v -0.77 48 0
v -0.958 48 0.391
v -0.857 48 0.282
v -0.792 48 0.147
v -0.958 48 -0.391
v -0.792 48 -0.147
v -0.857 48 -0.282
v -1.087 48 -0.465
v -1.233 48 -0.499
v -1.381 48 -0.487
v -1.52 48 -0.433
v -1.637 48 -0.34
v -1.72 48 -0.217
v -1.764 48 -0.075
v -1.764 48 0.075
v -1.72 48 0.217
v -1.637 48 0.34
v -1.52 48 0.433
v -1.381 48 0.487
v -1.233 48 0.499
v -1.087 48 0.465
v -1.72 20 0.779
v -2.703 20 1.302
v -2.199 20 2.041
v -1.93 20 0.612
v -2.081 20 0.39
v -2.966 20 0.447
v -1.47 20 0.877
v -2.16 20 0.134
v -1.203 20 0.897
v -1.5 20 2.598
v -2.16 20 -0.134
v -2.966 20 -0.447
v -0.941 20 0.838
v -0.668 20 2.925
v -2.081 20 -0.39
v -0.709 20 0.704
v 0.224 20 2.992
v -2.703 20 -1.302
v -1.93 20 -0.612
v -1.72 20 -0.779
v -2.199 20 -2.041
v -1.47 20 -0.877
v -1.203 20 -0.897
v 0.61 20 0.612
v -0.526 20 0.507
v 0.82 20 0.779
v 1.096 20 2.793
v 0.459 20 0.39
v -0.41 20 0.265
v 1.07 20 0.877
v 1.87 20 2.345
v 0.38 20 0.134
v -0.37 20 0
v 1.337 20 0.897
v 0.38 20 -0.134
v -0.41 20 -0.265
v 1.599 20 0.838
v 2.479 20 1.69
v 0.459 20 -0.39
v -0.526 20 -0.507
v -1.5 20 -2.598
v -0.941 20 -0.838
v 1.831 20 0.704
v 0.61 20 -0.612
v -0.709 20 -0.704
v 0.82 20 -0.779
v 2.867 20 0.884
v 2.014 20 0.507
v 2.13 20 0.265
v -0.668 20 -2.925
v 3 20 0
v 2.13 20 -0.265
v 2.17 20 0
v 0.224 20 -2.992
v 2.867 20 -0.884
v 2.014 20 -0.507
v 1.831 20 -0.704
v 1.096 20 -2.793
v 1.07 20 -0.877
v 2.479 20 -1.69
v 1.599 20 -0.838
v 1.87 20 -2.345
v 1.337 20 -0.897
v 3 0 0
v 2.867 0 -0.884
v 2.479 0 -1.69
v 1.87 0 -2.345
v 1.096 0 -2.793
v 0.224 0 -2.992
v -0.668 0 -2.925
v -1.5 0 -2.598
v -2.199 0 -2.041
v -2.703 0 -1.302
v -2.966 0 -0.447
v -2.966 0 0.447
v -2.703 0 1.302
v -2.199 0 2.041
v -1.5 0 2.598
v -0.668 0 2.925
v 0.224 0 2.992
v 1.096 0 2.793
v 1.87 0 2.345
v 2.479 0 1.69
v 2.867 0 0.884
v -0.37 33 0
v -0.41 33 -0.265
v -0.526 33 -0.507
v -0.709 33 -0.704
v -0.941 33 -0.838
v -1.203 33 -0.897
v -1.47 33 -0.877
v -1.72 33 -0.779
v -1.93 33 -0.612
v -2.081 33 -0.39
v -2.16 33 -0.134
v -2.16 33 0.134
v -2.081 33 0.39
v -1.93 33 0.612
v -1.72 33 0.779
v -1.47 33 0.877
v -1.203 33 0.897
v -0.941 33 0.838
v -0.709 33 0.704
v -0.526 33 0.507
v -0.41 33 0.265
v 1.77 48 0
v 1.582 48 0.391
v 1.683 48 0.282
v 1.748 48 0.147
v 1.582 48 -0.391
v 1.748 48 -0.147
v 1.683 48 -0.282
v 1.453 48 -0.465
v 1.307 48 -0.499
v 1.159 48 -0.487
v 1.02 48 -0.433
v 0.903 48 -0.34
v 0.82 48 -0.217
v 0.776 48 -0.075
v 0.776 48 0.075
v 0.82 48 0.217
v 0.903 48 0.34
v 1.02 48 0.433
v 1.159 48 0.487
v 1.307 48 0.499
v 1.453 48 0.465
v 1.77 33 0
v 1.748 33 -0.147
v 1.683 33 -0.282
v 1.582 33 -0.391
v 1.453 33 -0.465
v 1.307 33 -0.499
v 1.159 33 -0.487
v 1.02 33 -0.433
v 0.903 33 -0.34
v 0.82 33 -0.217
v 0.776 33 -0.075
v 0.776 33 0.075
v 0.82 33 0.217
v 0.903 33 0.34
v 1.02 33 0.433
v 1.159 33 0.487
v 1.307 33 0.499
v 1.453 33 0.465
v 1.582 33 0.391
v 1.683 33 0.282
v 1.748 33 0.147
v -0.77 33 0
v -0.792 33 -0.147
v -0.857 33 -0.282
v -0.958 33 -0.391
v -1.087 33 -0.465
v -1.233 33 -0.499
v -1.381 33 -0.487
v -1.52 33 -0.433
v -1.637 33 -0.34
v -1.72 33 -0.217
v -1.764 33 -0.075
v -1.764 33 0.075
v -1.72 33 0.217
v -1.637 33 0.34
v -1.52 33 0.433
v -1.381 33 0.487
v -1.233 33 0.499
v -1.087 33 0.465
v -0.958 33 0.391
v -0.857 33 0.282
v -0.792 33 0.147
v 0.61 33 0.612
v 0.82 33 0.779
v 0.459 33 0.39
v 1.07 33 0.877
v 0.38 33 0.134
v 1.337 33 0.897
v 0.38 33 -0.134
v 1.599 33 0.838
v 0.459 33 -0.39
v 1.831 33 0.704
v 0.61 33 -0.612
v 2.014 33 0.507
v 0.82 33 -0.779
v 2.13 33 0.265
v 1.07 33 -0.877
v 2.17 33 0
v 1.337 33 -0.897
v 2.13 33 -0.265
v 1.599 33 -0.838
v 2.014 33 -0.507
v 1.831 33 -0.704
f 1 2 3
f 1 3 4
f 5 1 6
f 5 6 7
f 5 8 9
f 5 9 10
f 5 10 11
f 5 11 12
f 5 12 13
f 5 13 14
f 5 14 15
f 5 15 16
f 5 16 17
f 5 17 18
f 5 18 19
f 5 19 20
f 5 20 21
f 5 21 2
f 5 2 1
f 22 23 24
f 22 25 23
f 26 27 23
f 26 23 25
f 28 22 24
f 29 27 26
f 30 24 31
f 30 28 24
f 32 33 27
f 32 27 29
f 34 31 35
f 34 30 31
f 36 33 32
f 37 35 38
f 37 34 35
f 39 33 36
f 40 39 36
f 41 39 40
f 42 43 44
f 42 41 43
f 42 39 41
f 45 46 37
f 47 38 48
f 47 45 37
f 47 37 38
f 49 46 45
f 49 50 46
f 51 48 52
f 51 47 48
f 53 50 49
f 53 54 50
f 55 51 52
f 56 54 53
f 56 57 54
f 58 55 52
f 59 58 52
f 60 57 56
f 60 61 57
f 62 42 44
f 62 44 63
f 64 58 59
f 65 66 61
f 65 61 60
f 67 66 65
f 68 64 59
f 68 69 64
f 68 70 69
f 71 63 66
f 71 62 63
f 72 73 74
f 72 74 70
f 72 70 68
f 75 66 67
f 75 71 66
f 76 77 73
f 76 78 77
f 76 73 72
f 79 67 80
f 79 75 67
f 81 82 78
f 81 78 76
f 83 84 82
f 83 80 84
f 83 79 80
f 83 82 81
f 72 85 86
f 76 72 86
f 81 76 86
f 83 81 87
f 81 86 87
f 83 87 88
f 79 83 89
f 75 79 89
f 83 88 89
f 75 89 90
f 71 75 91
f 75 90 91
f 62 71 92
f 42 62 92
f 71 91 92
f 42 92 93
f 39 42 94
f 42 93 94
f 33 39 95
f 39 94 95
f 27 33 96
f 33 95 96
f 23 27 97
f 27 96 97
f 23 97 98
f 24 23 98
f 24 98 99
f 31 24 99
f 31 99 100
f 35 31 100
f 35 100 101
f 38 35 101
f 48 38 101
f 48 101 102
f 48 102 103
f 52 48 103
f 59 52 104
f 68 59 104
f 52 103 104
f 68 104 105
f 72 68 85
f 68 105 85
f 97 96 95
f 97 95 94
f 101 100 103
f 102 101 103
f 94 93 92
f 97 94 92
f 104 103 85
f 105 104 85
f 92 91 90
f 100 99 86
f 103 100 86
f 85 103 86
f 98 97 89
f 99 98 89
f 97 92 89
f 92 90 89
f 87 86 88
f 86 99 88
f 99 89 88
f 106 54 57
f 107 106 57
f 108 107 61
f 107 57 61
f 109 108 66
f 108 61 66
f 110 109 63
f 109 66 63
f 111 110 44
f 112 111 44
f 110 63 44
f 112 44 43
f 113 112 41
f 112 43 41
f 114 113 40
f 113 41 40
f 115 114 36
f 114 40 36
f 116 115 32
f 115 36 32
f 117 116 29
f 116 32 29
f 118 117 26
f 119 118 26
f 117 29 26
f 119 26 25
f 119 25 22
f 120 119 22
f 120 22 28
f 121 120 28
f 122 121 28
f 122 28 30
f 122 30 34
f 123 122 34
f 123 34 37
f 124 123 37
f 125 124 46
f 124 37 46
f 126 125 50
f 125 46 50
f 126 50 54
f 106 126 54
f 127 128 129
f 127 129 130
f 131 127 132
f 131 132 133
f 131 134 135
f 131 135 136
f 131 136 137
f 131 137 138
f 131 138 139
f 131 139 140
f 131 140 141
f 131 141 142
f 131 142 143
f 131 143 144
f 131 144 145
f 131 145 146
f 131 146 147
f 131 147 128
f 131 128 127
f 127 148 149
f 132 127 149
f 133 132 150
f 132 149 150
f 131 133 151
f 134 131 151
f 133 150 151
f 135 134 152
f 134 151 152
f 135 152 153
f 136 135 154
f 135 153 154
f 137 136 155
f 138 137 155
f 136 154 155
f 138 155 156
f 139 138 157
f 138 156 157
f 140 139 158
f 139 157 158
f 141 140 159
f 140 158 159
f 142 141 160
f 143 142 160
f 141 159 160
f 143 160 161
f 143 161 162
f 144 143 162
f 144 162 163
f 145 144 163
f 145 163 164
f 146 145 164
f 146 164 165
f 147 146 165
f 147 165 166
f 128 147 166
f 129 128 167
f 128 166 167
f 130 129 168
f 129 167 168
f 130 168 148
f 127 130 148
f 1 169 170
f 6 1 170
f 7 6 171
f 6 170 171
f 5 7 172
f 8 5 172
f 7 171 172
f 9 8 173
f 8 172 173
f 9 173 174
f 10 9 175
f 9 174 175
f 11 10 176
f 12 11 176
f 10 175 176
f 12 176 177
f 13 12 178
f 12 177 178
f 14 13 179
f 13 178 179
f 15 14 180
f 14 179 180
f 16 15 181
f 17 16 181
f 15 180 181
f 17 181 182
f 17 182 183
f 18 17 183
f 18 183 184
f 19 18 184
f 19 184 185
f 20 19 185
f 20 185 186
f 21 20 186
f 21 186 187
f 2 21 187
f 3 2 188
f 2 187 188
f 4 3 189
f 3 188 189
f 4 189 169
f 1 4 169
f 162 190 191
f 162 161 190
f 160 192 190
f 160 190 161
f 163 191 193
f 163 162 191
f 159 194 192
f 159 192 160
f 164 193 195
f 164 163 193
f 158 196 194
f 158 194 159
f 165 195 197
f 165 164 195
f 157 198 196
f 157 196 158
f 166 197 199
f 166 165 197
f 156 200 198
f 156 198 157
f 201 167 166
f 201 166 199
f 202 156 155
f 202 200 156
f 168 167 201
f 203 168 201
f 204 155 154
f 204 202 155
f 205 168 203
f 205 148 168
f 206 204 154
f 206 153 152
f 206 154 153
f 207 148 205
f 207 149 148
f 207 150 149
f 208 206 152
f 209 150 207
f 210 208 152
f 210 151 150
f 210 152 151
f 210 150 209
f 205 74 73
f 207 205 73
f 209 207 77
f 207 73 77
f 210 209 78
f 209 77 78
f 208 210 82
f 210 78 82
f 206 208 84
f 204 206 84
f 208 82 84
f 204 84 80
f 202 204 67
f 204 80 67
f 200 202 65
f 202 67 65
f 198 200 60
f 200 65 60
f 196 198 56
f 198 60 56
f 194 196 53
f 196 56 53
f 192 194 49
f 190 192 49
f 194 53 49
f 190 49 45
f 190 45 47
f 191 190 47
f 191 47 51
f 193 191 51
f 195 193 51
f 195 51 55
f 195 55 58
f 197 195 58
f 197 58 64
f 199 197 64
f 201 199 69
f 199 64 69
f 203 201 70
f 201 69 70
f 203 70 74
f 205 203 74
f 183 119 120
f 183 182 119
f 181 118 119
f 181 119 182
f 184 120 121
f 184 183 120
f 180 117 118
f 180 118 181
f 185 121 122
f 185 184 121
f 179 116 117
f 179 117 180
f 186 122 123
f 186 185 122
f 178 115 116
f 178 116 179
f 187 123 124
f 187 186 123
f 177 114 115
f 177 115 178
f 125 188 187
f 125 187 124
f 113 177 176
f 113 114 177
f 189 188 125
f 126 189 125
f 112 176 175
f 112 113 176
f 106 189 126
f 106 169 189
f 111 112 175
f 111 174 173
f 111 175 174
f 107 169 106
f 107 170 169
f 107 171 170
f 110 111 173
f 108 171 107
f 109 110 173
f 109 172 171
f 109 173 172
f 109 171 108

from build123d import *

# Parameters (mm, degrees)
SKETCH1_R           = 3
BOSS_EXTRUDE1_DEPTH = 20
SKETCH2_R           = 0.9
BOSS_EXTRUDE2_DEPTH = 13
SKETCH3_R           = 0.5
BOSS_EXTRUDE3_DEPTH = 15


with BuildPart() as part:
    # Sketch1 → Boss-Extrude1 (new body)
    with BuildSketch(Plane(origin=(0, 0, 0), x_dir=(1, 0, 0), z_dir=(0, 1, 0))):
        Circle(SKETCH1_R)
    extrude(amount=BOSS_EXTRUDE1_DEPTH)

    # Sketch2 → Boss-Extrude2 (add)
    with BuildSketch(Plane(origin=(0, 20, 0), x_dir=(1, 0, 0), z_dir=(0, 1, 0))):
        with Locations((1.27, 0)):
            Circle(SKETCH2_R)
        with Locations((-1.27, 0)):
            Circle(SKETCH2_R)
    extrude(amount=BOSS_EXTRUDE2_DEPTH)

    # Sketch3 → Boss-Extrude3 (add)
    with BuildSketch(Plane(origin=(0, 33, 0), x_dir=(1, 0, 0), z_dir=(0, 1, 0))):
        with Locations((1.27, 0)):
            Circle(SKETCH3_R)
        with Locations((-1.27, 0)):
            Circle(SKETCH3_R)
    extrude(amount=BOSS_EXTRUDE3_DEPTH)


solid = part.part
